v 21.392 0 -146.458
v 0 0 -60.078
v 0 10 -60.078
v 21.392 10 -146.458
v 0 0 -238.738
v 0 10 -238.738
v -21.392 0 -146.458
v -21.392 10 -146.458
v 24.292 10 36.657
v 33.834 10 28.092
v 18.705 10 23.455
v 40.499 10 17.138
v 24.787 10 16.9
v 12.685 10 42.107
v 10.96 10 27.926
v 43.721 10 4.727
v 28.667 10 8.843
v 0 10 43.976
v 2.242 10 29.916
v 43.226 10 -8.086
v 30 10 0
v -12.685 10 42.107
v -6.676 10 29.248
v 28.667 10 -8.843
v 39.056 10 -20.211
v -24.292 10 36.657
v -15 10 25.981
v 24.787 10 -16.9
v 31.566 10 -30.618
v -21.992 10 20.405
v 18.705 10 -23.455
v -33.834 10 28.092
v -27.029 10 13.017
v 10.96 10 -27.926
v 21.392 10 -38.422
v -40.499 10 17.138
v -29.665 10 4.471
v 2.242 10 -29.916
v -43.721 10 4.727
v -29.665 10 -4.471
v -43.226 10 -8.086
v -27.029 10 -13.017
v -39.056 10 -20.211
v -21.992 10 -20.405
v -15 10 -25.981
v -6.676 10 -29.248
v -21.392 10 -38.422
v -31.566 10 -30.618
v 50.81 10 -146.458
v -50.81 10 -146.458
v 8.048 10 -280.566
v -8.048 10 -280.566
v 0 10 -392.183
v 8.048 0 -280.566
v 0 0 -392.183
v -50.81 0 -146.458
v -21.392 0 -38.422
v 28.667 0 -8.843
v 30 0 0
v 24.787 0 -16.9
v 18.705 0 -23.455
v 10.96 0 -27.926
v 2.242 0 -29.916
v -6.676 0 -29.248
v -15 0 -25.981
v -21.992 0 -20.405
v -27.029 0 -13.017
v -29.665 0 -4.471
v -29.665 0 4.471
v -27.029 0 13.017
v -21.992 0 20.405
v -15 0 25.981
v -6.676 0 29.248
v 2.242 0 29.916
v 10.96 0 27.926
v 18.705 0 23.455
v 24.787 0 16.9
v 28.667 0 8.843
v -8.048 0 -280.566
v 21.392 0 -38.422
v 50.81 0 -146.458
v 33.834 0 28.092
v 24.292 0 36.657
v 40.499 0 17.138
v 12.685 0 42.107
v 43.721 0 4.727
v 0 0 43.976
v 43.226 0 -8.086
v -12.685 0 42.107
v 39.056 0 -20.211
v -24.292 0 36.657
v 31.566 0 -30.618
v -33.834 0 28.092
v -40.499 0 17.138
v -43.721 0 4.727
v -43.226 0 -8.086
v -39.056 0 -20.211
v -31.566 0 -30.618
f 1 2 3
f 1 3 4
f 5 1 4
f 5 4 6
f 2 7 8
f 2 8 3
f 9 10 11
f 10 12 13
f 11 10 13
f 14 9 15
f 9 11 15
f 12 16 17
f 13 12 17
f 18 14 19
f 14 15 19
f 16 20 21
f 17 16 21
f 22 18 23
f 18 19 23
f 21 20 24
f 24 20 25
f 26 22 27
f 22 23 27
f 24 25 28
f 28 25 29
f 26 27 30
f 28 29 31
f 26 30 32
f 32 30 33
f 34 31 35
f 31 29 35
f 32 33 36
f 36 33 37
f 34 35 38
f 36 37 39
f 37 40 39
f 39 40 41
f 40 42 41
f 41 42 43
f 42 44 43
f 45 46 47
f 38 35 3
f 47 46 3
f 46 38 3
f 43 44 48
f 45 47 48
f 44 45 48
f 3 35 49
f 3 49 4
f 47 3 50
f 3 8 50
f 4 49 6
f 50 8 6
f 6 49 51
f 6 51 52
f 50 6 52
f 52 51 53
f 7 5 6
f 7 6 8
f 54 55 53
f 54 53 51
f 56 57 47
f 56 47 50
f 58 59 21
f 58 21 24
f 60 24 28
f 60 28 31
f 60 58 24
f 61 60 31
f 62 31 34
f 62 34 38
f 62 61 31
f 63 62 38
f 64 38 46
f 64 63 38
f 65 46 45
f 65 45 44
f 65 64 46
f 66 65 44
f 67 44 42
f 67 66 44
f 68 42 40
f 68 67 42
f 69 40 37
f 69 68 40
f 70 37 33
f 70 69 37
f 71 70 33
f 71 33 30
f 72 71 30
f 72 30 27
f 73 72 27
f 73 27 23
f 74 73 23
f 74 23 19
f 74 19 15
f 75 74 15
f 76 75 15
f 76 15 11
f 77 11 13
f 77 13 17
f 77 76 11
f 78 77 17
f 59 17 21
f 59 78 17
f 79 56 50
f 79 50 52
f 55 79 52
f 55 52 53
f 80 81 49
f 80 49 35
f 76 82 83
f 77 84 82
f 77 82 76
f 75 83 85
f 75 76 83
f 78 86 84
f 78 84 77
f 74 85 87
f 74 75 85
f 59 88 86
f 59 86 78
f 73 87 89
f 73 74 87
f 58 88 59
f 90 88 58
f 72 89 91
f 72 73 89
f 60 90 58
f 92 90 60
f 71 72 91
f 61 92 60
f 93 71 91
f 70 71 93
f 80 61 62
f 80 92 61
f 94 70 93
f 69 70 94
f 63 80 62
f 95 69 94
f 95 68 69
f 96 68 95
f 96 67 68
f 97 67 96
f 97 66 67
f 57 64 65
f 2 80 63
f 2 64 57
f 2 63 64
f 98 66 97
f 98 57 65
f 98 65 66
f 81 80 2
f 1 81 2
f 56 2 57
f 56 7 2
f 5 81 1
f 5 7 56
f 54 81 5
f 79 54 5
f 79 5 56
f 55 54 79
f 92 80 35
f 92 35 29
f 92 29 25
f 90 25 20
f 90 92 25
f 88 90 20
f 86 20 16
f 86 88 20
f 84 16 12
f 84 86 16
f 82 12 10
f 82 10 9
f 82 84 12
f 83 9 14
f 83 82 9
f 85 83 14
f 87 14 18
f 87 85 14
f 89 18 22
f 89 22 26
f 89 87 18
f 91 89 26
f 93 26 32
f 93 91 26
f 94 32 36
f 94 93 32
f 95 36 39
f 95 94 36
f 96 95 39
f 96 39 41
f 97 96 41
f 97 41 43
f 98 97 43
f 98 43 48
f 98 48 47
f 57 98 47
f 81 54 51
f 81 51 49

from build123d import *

# Parameters (mm, degrees)
SKETCH1_R           = 30
BOSS_EXTRUDE1_DEPTH = 10


with BuildPart() as part:
    # Sketch1 → Boss-Extrude1 (new body)
    with BuildSketch(Plane(origin=(0, 0, 0), x_dir=(1, 0, 0), z_dir=(0, 1, 0))):
        with BuildLine():
            Line((-21.391856852, 38.422206609), (-50.810091155, 146.458168919))
            Line((-50.810091155, 146.458168919), (-8.048011127, 280.566292355))
            Line((-8.048011127, 280.566292355), (0, 392.18316322))
            Line((0, 392.18316322), (8.048011127, 280.566292355))
            Line((8.048011127, 280.566292355), (50.810091155, 146.458168919))
            Line((50.810091155, 146.458168919), (21.391856852, 38.422206609))
            ThreePointArc((21.391856852, 38.422206609), (0, -43.97587407), (-21.391856852, 38.422206609))
        make_face()
        Circle(SKETCH1_R, mode=Mode.SUBTRACT)
        Polygon((0, 238.738180914), (-21.391856852, 146.458168919), (0, 60.077729237), (21.391856852, 146.458168919), align=None, mode=Mode.SUBTRACT)
    extrude(amount=BOSS_EXTRUDE1_DEPTH)


solid = part.part
